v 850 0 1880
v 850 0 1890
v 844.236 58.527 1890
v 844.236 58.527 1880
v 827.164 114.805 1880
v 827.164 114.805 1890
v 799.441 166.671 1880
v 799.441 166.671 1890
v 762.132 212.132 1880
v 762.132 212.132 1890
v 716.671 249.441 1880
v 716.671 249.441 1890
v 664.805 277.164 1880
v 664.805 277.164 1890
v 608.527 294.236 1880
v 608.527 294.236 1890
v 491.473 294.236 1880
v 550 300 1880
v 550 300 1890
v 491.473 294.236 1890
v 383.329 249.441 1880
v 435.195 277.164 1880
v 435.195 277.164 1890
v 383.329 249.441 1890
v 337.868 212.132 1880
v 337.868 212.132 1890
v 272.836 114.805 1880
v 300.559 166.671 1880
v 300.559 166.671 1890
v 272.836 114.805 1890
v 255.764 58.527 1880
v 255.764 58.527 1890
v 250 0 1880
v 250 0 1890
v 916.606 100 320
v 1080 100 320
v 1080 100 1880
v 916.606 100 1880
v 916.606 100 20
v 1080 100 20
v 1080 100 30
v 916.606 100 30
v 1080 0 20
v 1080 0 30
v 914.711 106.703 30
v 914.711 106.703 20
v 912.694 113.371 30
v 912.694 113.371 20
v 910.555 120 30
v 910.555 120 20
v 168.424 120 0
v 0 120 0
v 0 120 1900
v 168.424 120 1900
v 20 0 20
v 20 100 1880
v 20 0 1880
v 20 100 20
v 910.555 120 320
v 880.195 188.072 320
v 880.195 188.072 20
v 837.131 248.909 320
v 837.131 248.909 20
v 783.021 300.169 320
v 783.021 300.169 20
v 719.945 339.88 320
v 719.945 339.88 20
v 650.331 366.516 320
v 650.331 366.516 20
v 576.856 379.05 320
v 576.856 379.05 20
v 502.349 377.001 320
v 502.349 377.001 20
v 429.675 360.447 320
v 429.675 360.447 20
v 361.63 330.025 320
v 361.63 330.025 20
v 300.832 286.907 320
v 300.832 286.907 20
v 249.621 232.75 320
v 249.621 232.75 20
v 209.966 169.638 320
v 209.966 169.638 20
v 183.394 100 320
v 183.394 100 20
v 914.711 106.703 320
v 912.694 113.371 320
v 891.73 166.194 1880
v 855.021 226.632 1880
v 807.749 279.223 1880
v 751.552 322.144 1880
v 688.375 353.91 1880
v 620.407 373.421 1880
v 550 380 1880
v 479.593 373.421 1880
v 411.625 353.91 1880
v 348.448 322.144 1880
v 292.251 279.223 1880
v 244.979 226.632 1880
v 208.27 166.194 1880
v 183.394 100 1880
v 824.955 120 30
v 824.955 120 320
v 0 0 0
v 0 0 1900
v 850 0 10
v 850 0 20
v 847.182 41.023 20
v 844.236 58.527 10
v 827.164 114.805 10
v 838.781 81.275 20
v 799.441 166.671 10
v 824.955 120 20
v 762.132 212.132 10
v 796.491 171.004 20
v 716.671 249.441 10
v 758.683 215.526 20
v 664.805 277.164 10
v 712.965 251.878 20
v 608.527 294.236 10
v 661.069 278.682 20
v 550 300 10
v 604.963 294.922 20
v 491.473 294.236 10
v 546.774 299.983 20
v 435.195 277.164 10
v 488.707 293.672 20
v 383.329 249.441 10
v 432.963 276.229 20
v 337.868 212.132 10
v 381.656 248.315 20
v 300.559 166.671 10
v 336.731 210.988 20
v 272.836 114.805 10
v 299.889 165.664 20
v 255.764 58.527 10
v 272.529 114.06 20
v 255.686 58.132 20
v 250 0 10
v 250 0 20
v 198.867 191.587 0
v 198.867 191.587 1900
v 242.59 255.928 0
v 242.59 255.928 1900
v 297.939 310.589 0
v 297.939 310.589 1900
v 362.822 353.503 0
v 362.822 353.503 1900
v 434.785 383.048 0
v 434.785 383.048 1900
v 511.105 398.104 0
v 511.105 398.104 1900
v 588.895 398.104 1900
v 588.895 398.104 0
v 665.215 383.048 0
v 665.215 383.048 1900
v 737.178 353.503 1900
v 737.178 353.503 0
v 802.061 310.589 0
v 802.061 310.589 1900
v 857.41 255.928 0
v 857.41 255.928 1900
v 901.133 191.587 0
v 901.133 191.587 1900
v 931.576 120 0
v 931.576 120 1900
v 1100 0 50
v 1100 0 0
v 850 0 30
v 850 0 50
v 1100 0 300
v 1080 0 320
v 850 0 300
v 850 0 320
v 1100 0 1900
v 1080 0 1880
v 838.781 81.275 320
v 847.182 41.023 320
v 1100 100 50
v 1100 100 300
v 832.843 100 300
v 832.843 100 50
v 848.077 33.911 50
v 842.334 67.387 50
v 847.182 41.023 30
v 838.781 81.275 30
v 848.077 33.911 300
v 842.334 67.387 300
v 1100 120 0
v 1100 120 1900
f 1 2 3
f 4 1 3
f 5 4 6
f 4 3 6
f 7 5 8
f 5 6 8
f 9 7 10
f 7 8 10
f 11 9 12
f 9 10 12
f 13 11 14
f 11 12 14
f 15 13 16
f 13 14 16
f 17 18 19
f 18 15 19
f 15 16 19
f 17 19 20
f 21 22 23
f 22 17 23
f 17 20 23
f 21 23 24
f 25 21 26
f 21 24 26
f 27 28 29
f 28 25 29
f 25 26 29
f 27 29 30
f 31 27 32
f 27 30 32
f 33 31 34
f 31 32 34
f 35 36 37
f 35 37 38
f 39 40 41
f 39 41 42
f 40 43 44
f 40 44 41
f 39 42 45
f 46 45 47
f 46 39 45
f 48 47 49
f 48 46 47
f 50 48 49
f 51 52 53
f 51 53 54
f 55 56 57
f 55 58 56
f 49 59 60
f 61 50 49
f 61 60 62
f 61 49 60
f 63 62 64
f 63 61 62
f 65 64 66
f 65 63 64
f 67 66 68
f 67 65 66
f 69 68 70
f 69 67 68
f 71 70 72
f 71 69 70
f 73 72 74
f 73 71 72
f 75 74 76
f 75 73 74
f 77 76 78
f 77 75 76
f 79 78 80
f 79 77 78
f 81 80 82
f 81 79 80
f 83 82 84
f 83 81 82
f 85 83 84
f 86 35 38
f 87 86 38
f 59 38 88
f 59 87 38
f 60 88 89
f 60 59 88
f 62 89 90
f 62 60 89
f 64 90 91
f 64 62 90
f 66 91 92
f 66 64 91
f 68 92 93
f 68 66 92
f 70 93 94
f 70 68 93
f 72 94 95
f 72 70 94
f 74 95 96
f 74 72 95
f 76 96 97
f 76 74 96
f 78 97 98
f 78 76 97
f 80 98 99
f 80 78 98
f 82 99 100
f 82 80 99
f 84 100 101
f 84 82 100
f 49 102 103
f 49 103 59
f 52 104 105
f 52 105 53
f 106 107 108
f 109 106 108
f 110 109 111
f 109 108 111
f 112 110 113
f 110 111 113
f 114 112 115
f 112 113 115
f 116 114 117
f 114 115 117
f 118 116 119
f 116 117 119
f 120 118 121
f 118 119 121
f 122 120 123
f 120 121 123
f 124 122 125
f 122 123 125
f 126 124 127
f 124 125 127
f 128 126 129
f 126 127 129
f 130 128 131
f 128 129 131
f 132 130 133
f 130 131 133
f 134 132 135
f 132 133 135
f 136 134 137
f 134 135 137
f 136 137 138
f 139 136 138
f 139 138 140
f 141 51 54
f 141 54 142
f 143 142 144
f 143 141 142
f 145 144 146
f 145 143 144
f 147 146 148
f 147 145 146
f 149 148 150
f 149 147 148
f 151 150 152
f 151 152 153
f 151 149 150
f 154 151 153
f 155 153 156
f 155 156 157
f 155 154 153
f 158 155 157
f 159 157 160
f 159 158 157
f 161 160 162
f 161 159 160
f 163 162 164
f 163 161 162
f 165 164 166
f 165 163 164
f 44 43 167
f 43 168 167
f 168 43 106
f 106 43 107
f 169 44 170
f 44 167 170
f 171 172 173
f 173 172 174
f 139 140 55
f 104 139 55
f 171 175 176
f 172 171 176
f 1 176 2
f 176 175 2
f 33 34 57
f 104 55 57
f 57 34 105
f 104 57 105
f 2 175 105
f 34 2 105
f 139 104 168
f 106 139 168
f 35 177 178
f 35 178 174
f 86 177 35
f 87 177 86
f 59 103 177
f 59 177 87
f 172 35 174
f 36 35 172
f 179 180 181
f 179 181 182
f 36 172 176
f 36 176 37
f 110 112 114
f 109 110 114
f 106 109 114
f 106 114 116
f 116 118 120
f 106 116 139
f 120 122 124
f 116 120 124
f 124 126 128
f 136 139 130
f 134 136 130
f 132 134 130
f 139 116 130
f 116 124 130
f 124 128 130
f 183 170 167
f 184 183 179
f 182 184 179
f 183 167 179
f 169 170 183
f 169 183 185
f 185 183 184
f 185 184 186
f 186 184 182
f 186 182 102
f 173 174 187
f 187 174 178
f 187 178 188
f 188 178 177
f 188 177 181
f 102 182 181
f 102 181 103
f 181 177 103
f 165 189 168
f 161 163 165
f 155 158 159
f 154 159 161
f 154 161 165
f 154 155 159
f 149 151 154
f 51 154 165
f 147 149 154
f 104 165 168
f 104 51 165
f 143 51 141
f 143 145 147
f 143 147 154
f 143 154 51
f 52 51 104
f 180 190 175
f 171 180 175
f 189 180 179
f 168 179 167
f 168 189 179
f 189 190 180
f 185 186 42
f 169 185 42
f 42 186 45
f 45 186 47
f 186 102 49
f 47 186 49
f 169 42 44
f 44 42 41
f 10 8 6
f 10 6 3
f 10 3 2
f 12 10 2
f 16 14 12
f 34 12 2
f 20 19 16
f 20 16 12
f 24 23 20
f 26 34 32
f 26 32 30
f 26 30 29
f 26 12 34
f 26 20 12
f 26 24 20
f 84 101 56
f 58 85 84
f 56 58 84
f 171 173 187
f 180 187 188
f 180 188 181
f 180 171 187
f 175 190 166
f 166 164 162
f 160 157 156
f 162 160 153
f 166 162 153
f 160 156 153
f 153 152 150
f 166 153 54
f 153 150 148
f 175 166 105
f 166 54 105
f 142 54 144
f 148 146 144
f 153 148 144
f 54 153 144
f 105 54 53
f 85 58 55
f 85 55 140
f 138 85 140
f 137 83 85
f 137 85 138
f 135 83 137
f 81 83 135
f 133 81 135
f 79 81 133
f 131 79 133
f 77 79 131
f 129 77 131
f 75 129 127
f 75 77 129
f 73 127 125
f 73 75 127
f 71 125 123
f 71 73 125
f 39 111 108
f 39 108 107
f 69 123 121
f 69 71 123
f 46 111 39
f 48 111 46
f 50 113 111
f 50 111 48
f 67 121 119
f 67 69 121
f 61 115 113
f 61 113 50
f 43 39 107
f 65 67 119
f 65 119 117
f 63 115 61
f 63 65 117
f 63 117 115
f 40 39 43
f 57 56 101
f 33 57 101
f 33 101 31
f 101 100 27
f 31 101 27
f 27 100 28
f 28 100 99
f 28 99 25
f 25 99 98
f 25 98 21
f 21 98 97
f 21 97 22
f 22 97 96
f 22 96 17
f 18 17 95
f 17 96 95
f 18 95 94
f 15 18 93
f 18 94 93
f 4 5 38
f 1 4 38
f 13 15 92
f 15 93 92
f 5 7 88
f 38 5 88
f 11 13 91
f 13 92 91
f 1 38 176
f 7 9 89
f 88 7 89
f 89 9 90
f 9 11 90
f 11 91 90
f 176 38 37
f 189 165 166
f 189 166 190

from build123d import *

# Parameters (mm, degrees)
BOSS_EXTRUDE1_DEPTH = 1900
SKETCH2_R           = 300
CUT_EXTRUDE1_DEPTH  = 2232.591360442
SKETCH4_W           = 250
SKETCH4_H           = 100
CUT_EXTRUDE3_DEPTH  = 550
SHELL1_START        = 320
SHELL1_DEPTH        = 1560
SHELL1_START_2      = 20
SHELL1_2_DEPTH      = 300
SHELL1_3_DEPTH      = 10
BOSS_EXTRUDE2_START = -10
BOSS_EXTRUDE2_DEPTH = 10
BOSS_EXTRUDE3_DEPTH = 10


# Read off the part's stored shape, not the designer's step: Shell1
with BuildPart() as part:
    # Sketch1 → Boss-Extrude1 (new body)
    with BuildSketch(Plane.XY):
        with BuildLine():
            Line((931.575680567, 120), (1100, 120))
            Line((1100, 120), (1100, 0))
            Line((1100, 0), (0, 0))
            Line((0, 0), (0, 120))
            Line((0, 120), (168.424319433, 120))
            ThreePointArc((168.424319433, 120), (550, 400), (931.575680567, 120))
        make_face()
    extrude(amount=BOSS_EXTRUDE1_DEPTH)

    # Sketch2 → Cut-Extrude1 (cut, through all)
    with BuildSketch(Plane.XY.offset(1900)):
        with Locations((550, 0)):
            Circle(SKETCH2_R)
    extrude(amount=-CUT_EXTRUDE1_DEPTH, mode=Mode.SUBTRACT)

    # Sketch4 → Cut-Extrude3 (cut)
    with BuildSketch(Plane(origin=(1100, 0, 0), x_dir=(0, 0, -1), z_dir=(1, 0, 0))):
        with Locations((-175, 50)):
            Rectangle(SKETCH4_W, SKETCH4_H)
    extrude(amount=-CUT_EXTRUDE3_DEPTH, mode=Mode.SUBTRACT)

    # Shell1 outline → Shell1 (cut)
    with BuildSketch(Plane.XY.offset(SHELL1_START)):
        with BuildLine():
            ThreePointArc((916.606055596, 100), (550, 380), (183.393944404, 100))
            Line((183.393944404, 100), (20, 100))
            Line((20, 100), (20, 0))
            Line((20, 0), (250, 0))
            ThreePointArc((250, 0), (550, 300), (850, 0))
            Line((850, 0), (1080, 0))
            Line((1080, 0), (1080, 100))
            Line((1080, 100), (916.606055596, 100))
        make_face()
    extrude(amount=SHELL1_DEPTH, mode=Mode.SUBTRACT)

    # Shell1 2 outline → Shell1 2 (cut)
    with BuildSketch(Plane.XY.offset(SHELL1_START_2)):
        with BuildLine():
            Line((824.954541697, 120), (910.555127546, 120))
            ThreePointArc((910.555127546, 120), (539.552347988, 379.856349911), (183.393944404, 100))
            Line((183.393944404, 100), (20, 100))
            Line((20, 100), (20, 0))
            Line((20, 0), (250, 0))
            ThreePointArc((250, 0), (488.707106893, 293.671893879), (824.954541697, 120))
        make_face()
    extrude(amount=SHELL1_2_DEPTH, mode=Mode.SUBTRACT)

    # Shell1 3 outline → Shell1 3 (cut)
    with BuildSketch(Plane.XY.offset(SHELL1_START_2)):
        with BuildLine():
            ThreePointArc((916.606055596, 100), (913.718086665, 110.041598646), (910.555127546, 120))
            Line((910.555127546, 120), (824.954541697, 120))
            ThreePointArc((824.954541697, 120), (843.671893879, 61.292893107), (850, 0))
            Line((850, 0), (1080, 0))
            Line((1080, 0), (1080, 100))
            Line((1080, 100), (916.606055596, 100))
        make_face()
    extrude(amount=SHELL1_3_DEPTH, mode=Mode.SUBTRACT)

    # Sketch5 → Boss-Extrude2 (add)
    with BuildSketch(Plane(origin=(0, 0, 0), x_dir=(-1, 0, 0), z_dir=(0, 0, -1)).offset(BOSS_EXTRUDE2_START)):
        with BuildLine():
            Line((-850, 0), (-250, 0))
            ThreePointArc((-250, 0), (-550, 300), (-850, 0))
        make_face()
    extrude(amount=BOSS_EXTRUDE2_DEPTH)

    # Sketch6 → Boss-Extrude3 (add)
    with BuildSketch(Plane.XY.offset(1900)):
        with BuildLine():
            Line((850, 0), (250, 0))
            ThreePointArc((250, 0), (550, 300), (850, 0))
        make_face()
    extrude(amount=-BOSS_EXTRUDE3_DEPTH)


solid = part.part
